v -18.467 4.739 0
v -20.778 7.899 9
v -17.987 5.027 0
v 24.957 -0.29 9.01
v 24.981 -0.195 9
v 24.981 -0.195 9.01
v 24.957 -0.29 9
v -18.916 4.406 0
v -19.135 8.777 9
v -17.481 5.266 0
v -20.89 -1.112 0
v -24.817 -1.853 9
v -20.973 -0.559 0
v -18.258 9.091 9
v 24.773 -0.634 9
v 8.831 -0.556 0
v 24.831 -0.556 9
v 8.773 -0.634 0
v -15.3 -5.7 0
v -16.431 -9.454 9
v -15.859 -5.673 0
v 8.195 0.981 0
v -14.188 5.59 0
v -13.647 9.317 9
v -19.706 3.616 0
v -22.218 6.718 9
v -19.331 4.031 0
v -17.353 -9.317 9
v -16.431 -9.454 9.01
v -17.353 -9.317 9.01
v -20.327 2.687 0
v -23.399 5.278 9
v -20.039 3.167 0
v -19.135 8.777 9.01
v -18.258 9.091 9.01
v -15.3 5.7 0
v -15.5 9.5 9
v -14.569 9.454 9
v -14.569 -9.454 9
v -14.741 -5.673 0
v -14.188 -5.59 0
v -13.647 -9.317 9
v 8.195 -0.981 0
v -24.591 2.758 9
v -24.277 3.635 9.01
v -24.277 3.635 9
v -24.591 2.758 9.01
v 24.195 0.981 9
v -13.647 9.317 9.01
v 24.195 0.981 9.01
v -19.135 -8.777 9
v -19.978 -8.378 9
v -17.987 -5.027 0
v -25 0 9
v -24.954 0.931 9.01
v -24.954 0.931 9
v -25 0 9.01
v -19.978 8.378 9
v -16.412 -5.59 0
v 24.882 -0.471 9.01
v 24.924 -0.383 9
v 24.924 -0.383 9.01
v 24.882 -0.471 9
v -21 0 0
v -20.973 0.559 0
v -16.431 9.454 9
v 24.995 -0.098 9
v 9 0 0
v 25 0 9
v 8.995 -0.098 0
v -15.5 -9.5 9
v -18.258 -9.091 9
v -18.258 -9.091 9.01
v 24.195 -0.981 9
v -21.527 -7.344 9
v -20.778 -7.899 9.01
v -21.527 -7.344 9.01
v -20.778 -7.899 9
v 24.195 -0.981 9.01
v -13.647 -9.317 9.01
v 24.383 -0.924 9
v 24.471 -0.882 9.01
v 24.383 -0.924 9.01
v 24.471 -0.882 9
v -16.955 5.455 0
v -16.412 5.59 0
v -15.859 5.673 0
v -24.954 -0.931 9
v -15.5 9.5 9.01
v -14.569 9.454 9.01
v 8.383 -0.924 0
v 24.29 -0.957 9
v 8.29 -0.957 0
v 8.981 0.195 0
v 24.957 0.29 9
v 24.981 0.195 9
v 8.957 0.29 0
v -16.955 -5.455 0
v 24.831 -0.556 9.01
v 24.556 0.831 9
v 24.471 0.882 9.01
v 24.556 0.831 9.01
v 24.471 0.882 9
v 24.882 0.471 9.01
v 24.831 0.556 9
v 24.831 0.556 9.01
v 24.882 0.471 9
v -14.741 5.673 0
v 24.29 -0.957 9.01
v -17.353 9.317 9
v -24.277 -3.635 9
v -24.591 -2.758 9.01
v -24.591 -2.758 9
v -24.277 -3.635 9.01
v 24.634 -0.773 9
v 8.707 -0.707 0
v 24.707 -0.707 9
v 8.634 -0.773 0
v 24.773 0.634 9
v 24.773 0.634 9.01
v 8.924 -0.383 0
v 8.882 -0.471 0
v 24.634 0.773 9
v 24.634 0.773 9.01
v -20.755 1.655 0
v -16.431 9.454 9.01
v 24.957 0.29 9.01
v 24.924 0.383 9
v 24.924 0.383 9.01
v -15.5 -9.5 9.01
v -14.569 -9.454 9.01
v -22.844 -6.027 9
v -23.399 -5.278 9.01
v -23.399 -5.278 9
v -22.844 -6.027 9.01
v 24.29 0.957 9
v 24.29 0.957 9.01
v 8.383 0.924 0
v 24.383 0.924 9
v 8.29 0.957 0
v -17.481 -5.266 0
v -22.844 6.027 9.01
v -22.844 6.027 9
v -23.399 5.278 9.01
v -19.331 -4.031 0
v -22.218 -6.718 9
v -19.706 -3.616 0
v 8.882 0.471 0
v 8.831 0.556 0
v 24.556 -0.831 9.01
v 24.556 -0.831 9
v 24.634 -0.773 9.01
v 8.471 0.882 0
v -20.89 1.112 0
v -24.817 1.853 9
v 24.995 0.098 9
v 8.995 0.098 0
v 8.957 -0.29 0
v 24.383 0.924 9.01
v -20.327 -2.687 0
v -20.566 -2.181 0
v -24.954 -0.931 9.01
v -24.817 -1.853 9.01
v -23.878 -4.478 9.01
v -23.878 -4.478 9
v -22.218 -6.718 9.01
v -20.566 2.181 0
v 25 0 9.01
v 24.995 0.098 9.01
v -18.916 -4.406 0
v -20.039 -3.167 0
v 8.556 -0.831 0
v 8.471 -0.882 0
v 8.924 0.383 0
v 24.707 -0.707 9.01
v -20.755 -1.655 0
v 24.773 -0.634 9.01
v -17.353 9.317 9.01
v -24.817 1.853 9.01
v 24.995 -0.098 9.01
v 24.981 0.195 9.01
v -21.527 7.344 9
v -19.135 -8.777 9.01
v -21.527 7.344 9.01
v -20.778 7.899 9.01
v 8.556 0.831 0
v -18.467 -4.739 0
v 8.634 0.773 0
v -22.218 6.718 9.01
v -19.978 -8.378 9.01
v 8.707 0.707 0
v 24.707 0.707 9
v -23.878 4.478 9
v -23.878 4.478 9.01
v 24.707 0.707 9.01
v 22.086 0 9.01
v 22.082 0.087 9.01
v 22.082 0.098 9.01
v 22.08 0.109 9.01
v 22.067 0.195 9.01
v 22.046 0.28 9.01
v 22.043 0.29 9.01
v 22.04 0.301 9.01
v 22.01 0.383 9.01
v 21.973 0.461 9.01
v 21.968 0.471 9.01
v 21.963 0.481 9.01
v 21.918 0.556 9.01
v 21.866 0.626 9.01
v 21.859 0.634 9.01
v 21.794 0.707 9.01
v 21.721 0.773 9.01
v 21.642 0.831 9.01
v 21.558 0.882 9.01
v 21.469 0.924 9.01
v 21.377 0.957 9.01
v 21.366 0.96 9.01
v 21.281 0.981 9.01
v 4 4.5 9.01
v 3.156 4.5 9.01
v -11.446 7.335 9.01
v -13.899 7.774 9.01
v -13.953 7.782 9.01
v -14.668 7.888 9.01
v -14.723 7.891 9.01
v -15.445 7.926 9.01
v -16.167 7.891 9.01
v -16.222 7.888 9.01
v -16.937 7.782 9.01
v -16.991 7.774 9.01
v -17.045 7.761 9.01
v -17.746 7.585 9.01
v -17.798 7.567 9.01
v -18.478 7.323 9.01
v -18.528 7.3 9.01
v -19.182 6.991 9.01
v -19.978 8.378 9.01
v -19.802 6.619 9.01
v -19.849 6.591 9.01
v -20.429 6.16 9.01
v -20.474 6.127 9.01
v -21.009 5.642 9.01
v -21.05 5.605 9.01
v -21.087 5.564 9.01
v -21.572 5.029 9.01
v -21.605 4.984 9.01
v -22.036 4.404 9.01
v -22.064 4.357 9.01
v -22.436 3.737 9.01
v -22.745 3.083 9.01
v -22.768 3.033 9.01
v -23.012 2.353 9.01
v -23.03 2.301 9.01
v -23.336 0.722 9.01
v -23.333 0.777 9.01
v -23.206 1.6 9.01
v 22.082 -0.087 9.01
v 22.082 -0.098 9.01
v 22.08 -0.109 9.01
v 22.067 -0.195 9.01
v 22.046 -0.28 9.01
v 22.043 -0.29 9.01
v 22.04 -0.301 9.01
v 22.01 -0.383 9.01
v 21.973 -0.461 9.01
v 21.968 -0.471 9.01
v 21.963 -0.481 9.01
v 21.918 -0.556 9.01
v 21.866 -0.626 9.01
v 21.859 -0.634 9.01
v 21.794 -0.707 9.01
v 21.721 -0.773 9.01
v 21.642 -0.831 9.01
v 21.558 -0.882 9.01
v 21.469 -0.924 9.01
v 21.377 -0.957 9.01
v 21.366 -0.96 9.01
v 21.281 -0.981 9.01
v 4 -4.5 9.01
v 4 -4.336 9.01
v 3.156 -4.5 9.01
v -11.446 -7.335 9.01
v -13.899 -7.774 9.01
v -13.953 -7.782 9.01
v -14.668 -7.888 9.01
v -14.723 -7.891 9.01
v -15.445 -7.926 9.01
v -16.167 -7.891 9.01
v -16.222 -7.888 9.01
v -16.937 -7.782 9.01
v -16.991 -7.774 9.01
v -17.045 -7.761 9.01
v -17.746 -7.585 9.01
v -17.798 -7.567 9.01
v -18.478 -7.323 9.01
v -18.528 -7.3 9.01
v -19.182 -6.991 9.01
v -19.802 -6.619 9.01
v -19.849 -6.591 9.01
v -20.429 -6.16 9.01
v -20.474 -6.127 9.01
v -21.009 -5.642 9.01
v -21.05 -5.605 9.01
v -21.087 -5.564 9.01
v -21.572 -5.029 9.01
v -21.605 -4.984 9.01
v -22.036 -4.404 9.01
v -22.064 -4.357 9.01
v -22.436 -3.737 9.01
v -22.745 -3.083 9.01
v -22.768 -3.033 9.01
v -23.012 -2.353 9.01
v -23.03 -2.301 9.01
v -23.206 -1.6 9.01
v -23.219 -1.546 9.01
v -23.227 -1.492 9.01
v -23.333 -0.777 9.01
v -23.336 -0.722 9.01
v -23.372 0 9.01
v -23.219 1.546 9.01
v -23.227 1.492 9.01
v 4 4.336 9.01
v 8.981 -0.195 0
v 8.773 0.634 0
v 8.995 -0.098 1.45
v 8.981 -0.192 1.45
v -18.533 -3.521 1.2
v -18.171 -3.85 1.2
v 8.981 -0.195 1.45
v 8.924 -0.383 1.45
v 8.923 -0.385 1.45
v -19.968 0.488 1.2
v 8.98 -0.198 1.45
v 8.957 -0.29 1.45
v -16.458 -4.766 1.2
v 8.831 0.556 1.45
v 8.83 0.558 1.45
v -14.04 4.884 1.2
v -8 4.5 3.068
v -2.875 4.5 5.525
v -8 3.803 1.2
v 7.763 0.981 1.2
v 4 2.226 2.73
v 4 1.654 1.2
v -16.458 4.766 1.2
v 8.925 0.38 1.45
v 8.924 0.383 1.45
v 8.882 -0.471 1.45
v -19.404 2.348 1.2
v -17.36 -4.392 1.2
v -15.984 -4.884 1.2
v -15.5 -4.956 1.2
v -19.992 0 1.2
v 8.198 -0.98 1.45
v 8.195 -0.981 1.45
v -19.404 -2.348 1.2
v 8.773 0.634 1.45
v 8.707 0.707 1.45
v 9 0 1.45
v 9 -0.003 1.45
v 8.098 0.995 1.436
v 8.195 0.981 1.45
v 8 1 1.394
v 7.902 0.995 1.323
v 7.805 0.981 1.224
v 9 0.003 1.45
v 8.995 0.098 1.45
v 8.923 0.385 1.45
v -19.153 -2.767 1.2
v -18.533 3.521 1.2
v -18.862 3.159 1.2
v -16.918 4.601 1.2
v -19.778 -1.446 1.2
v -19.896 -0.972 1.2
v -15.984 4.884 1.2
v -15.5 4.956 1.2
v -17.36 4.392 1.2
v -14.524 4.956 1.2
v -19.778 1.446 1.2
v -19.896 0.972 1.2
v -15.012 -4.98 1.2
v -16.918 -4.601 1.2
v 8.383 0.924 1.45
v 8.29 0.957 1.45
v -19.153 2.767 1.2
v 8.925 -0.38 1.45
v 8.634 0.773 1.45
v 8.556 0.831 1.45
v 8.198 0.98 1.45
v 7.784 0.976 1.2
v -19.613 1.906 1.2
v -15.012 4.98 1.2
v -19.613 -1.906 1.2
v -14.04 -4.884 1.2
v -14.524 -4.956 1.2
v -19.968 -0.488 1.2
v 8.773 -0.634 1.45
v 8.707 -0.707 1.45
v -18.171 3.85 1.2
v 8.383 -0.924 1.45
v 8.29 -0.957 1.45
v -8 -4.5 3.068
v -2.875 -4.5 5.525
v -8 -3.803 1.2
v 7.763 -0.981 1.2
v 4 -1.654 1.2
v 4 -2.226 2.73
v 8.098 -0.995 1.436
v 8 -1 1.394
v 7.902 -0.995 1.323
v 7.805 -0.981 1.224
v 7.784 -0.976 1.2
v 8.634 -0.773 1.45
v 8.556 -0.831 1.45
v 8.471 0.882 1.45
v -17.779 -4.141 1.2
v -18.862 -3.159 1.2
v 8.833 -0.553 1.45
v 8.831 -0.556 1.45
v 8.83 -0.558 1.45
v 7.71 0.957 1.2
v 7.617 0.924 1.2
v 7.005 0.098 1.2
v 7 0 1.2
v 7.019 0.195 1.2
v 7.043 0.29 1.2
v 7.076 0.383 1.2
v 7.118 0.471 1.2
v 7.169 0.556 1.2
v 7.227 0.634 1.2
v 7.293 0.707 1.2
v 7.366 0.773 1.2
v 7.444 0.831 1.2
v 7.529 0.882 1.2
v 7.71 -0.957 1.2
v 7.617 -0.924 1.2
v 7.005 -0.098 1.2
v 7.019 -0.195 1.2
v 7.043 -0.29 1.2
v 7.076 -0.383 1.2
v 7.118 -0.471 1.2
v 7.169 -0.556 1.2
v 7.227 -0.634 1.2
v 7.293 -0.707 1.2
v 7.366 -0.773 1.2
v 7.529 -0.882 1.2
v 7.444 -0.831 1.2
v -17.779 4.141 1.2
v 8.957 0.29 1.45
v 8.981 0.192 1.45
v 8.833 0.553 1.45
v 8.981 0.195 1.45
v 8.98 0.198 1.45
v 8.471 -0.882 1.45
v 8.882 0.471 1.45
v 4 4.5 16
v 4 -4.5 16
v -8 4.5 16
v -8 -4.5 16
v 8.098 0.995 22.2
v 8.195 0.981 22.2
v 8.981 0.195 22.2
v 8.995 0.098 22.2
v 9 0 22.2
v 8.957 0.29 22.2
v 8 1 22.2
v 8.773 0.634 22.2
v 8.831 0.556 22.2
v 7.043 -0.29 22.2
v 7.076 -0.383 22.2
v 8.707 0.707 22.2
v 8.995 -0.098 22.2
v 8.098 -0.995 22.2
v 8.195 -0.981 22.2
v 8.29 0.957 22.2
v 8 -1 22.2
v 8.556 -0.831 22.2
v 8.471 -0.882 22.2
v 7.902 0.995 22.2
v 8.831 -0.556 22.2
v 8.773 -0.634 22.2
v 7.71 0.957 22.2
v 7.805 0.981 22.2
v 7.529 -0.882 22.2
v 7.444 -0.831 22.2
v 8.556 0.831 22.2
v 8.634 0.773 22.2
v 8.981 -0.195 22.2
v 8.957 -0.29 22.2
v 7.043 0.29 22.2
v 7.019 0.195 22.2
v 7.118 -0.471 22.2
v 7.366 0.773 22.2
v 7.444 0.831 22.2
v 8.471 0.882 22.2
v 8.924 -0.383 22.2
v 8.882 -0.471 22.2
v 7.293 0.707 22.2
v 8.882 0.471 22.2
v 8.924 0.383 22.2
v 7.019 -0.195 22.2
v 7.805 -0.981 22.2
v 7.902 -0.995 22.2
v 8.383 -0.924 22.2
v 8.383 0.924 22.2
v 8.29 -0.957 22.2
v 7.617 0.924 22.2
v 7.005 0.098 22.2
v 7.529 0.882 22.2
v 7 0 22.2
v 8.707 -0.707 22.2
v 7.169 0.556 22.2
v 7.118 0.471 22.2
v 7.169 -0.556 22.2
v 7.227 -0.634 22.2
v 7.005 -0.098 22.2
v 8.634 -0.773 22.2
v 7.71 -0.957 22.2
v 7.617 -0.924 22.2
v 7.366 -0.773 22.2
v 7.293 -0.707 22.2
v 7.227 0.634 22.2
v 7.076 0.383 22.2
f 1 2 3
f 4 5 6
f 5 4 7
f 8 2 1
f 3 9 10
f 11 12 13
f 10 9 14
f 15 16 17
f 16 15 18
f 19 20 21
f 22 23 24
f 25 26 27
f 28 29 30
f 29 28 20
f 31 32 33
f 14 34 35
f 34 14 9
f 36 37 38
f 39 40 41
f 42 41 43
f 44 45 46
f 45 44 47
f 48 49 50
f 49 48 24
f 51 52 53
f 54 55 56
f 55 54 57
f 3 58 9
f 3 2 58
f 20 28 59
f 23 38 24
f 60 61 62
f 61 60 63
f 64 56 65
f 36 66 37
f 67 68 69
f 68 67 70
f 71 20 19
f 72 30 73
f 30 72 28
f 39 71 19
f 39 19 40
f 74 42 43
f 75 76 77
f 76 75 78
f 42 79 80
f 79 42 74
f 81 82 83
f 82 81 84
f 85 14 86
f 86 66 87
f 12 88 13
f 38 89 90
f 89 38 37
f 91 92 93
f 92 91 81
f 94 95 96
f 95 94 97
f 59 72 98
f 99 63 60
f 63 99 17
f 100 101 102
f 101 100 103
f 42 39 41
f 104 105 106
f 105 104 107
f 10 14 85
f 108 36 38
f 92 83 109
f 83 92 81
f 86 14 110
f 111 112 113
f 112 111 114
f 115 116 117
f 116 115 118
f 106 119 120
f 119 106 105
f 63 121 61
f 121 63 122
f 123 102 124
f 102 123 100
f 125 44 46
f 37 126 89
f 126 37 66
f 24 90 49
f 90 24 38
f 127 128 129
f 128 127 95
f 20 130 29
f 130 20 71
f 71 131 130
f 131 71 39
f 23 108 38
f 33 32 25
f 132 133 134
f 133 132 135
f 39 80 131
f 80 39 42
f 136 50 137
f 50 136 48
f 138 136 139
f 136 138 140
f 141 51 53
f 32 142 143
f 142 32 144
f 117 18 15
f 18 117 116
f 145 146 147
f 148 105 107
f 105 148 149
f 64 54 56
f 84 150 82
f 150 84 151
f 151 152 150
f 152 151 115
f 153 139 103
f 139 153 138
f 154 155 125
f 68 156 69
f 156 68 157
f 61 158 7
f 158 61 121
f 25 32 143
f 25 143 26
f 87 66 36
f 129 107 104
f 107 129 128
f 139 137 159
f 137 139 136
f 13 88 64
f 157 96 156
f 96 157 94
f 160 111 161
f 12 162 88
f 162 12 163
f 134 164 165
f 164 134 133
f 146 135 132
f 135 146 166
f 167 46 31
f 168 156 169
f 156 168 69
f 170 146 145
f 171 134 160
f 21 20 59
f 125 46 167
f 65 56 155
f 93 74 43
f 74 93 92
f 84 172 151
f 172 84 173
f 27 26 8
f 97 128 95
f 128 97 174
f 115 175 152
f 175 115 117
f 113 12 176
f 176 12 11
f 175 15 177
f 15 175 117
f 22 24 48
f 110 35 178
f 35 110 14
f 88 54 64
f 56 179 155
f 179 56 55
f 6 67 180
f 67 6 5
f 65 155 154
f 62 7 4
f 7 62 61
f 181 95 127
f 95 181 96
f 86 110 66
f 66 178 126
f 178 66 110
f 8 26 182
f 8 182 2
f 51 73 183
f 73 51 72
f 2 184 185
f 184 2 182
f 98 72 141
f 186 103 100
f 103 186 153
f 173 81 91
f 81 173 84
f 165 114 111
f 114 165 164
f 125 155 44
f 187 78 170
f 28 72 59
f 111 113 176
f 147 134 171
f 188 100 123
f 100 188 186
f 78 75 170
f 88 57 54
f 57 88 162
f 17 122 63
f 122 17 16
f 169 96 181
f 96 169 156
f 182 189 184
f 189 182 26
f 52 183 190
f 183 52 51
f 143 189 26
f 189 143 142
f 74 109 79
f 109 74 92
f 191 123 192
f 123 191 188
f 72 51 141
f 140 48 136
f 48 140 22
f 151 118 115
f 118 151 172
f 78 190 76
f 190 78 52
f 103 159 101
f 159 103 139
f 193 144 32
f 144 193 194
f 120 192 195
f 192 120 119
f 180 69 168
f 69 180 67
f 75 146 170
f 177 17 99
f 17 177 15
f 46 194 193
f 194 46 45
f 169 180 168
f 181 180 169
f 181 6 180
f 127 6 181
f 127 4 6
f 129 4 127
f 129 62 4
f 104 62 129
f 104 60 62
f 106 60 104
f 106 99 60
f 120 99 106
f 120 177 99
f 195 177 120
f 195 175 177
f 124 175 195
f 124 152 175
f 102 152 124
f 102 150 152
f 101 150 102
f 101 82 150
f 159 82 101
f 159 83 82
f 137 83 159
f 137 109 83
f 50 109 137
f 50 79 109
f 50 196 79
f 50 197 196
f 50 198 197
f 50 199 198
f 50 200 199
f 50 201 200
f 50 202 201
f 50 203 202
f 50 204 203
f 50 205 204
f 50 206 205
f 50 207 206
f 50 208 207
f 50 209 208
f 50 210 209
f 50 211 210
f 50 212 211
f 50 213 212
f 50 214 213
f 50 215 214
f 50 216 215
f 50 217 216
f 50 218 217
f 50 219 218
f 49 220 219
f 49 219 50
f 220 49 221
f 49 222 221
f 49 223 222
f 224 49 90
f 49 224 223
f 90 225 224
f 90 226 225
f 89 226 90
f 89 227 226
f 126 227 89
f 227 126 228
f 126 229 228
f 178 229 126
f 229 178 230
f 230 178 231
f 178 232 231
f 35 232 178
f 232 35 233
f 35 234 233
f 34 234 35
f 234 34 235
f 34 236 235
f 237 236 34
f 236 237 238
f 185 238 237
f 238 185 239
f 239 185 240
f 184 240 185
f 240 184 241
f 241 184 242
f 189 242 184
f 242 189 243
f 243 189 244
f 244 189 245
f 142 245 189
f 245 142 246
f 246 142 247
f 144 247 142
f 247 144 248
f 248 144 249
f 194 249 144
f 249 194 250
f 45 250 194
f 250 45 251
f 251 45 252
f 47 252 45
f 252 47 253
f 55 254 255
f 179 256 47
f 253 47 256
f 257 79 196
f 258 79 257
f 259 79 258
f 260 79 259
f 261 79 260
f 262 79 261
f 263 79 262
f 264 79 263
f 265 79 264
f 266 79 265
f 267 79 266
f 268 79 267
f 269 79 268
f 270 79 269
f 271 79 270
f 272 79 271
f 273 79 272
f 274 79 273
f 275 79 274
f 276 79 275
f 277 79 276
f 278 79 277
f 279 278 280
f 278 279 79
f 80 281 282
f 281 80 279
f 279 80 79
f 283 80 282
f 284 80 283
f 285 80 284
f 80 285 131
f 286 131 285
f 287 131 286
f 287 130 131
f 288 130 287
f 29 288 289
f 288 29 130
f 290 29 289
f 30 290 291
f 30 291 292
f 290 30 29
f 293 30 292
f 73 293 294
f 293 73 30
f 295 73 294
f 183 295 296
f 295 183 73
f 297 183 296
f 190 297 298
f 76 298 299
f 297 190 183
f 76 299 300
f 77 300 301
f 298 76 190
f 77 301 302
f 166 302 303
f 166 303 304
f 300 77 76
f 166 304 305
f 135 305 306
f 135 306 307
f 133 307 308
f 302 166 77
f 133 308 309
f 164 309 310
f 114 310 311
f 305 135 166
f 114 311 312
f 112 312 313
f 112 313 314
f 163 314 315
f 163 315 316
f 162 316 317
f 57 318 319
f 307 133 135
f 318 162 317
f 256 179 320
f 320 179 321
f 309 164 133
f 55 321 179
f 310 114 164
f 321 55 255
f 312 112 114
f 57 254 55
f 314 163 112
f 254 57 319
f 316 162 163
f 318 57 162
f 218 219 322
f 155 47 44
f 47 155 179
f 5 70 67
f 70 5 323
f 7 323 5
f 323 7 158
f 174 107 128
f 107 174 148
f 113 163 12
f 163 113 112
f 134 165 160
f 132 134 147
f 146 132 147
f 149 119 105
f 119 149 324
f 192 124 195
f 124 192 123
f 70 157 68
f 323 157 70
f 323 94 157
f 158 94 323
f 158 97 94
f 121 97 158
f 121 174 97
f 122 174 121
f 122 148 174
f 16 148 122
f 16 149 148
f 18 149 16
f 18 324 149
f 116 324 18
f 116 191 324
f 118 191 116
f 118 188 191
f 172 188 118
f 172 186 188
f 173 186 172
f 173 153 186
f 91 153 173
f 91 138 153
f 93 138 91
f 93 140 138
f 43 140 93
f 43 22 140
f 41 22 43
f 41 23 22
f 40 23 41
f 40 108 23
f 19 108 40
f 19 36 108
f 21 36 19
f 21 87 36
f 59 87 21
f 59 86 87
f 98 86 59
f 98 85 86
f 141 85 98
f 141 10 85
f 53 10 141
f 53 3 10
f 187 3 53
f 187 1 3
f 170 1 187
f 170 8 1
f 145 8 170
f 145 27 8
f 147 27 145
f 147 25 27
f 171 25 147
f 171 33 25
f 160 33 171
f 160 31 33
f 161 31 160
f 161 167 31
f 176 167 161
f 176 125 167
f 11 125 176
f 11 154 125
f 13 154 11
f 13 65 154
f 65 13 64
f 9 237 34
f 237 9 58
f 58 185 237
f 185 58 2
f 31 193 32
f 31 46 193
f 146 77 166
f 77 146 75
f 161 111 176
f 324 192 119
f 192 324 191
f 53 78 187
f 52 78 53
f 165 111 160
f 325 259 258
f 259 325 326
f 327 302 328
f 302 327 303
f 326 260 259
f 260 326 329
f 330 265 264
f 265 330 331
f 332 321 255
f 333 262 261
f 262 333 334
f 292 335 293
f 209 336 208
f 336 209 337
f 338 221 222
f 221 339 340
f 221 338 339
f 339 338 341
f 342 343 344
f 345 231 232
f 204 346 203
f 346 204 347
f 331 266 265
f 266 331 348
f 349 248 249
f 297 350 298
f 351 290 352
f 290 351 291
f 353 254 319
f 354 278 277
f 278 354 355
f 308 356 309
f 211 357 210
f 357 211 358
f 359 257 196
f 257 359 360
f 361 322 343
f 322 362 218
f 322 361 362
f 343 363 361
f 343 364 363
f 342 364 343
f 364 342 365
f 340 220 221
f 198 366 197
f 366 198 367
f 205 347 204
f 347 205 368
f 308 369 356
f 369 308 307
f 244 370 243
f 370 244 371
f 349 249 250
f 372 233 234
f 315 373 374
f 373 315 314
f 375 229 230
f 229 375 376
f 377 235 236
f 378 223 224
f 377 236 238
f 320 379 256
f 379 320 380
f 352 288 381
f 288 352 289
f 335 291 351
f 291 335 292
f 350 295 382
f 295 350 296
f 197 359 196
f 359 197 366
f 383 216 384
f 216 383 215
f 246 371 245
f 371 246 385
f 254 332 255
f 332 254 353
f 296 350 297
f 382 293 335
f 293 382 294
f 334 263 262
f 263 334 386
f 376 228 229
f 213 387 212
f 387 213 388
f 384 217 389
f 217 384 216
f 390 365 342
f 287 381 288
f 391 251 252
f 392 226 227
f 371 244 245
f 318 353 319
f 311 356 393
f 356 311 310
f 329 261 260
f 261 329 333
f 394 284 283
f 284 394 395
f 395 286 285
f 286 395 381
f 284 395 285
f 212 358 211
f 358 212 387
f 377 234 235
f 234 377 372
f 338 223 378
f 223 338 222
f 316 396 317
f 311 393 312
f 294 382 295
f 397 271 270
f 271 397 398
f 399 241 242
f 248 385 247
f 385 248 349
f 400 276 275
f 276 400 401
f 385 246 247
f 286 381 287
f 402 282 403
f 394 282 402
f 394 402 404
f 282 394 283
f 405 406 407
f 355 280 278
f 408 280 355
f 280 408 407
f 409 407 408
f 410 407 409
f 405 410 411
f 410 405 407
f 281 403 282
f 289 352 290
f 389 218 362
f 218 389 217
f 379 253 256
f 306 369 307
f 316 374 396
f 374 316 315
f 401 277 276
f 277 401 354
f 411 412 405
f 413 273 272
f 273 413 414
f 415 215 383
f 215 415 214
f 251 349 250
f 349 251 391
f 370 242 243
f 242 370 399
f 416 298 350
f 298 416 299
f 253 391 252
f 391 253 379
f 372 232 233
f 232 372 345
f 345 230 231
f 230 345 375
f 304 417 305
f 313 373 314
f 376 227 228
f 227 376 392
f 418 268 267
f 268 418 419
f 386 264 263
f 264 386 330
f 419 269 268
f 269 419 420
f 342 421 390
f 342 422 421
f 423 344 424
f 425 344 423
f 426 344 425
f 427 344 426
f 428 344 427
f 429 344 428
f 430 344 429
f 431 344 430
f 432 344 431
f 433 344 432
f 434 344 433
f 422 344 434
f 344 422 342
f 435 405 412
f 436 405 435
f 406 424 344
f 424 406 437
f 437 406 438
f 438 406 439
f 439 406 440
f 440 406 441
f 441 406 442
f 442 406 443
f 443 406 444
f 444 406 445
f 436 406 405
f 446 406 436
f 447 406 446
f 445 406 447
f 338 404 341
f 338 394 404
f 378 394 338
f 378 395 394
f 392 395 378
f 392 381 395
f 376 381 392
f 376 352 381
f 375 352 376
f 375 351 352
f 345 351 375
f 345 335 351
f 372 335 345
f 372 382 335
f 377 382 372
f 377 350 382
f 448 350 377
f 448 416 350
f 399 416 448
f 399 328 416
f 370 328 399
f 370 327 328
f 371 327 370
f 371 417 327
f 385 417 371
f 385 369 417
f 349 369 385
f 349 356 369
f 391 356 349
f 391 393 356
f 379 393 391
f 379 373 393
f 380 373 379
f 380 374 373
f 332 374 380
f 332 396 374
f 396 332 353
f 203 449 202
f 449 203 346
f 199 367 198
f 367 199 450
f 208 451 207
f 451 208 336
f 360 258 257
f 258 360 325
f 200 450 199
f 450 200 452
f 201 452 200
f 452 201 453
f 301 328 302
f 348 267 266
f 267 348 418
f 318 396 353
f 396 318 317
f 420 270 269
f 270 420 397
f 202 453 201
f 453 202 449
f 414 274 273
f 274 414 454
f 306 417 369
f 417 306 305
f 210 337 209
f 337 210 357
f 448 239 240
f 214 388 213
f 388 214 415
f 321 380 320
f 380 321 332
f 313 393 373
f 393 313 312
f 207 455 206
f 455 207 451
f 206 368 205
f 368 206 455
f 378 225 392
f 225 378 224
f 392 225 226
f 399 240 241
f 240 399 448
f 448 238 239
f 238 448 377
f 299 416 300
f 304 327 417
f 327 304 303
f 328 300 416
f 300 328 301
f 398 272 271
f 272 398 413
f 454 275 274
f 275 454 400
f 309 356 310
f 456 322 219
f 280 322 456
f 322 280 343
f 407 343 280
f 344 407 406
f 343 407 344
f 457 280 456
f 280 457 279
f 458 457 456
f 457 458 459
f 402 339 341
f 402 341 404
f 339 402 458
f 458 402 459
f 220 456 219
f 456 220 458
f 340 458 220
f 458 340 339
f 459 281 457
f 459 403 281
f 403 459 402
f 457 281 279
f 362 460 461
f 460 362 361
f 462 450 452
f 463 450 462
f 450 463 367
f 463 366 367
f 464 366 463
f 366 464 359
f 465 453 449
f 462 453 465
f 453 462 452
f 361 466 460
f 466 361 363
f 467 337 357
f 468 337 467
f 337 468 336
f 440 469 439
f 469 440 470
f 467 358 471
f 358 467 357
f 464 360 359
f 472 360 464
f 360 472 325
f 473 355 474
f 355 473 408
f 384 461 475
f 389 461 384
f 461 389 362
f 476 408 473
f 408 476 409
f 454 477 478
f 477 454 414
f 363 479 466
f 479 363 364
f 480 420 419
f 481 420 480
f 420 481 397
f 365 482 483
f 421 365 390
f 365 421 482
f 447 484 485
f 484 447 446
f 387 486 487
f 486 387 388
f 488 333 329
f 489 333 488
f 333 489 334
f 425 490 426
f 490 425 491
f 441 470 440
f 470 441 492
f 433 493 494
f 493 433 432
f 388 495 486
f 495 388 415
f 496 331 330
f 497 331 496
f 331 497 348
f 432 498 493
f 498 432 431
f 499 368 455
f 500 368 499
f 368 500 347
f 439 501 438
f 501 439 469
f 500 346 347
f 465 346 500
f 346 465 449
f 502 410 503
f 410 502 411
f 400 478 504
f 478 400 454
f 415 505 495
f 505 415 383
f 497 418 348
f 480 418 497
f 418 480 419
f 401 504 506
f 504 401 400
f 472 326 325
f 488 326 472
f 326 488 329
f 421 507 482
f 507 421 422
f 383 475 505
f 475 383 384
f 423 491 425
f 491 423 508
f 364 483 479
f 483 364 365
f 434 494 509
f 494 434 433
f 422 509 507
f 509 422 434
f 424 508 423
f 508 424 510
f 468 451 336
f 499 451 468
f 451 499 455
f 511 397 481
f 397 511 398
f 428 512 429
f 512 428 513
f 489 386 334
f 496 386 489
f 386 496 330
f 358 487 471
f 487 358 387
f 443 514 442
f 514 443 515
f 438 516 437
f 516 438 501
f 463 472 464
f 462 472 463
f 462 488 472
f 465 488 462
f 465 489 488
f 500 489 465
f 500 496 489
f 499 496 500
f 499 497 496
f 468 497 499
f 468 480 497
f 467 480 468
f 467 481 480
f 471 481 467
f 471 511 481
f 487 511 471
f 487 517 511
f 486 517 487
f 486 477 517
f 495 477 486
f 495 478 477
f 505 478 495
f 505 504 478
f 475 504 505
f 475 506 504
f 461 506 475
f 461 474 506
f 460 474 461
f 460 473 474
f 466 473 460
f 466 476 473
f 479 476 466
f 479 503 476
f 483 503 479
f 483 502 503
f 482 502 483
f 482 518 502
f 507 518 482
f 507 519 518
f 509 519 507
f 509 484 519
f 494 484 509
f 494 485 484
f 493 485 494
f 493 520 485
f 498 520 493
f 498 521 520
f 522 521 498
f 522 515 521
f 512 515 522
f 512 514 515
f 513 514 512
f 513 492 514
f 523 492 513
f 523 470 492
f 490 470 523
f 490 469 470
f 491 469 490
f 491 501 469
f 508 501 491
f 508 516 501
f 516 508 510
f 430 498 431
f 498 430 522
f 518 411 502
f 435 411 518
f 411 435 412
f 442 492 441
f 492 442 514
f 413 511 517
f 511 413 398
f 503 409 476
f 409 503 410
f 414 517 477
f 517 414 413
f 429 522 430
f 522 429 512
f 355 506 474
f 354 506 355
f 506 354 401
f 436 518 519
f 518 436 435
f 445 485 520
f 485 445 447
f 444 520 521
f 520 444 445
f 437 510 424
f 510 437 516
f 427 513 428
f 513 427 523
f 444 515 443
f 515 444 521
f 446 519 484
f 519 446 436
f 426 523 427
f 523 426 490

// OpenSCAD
// Two-colour boat, 50 mm long. Flat bottom, no supports.
// part: "all" (preview), "hull" (black), "top" (white: cabin + mast)
part = "all";
length = 50;
width = 19;
height = 9;
wall = 1.2;
bottom_scale = 0.6;   // bottom footprint relative to deck
cabin_len = 12;
cabin_w = 9;
cabin_h = 7;          // above deck
cabin_x = -8;
mast_d = 2;
mast_h = 22;
mast_x = 8;
$fn = 64;

// Deck outline: rounded stern, pointed bow. Extremes land exactly at +-l/2.
module plan(l, w) {
  hull() {
    translate([-l/2 + w/2, 0]) circle(d = w);
    translate([l/2 - 1, 0]) circle(d = 2);
  }
}

module hull_shape(l, w, h) {
  hull() {
    translate([-(l - l*bottom_scale)/2 * 0.6, 0, 0]) linear_extrude(0.01) plan(l*bottom_scale, w*bottom_scale);
    translate([0, 0, h]) linear_extrude(0.01) plan(l, w);
  }
}

module outer() { hull_shape(length, width, height); }

module hull_body() {
  difference() {
    outer();
    translate([0, 0, wall]) hull_shape(length - 2*wall, width - 2*wall, height - wall + 1);
  }
}

// Cabin + mast, with the hull subtracted so the two colour parts never overlap.
module top_body() {
  difference() {
    union() {
      intersection() {
        translate([cabin_x, -cabin_w/2, wall - 1]) cube([cabin_len, cabin_w, height + cabin_h - wall + 1]);
        union() {
          outer();
          translate([0, 0, height - 0.01]) linear_extrude(cabin_h + 1) plan(length, width);
        }
      }
      translate([mast_x, 0, wall - 1]) cylinder(d = mast_d, h = mast_h);
    }
    hull_body();
  }
}

if (part == "hull") hull_body();
else if (part == "top") top_body();
else { color("#222") hull_body(); color("white") top_body(); }
